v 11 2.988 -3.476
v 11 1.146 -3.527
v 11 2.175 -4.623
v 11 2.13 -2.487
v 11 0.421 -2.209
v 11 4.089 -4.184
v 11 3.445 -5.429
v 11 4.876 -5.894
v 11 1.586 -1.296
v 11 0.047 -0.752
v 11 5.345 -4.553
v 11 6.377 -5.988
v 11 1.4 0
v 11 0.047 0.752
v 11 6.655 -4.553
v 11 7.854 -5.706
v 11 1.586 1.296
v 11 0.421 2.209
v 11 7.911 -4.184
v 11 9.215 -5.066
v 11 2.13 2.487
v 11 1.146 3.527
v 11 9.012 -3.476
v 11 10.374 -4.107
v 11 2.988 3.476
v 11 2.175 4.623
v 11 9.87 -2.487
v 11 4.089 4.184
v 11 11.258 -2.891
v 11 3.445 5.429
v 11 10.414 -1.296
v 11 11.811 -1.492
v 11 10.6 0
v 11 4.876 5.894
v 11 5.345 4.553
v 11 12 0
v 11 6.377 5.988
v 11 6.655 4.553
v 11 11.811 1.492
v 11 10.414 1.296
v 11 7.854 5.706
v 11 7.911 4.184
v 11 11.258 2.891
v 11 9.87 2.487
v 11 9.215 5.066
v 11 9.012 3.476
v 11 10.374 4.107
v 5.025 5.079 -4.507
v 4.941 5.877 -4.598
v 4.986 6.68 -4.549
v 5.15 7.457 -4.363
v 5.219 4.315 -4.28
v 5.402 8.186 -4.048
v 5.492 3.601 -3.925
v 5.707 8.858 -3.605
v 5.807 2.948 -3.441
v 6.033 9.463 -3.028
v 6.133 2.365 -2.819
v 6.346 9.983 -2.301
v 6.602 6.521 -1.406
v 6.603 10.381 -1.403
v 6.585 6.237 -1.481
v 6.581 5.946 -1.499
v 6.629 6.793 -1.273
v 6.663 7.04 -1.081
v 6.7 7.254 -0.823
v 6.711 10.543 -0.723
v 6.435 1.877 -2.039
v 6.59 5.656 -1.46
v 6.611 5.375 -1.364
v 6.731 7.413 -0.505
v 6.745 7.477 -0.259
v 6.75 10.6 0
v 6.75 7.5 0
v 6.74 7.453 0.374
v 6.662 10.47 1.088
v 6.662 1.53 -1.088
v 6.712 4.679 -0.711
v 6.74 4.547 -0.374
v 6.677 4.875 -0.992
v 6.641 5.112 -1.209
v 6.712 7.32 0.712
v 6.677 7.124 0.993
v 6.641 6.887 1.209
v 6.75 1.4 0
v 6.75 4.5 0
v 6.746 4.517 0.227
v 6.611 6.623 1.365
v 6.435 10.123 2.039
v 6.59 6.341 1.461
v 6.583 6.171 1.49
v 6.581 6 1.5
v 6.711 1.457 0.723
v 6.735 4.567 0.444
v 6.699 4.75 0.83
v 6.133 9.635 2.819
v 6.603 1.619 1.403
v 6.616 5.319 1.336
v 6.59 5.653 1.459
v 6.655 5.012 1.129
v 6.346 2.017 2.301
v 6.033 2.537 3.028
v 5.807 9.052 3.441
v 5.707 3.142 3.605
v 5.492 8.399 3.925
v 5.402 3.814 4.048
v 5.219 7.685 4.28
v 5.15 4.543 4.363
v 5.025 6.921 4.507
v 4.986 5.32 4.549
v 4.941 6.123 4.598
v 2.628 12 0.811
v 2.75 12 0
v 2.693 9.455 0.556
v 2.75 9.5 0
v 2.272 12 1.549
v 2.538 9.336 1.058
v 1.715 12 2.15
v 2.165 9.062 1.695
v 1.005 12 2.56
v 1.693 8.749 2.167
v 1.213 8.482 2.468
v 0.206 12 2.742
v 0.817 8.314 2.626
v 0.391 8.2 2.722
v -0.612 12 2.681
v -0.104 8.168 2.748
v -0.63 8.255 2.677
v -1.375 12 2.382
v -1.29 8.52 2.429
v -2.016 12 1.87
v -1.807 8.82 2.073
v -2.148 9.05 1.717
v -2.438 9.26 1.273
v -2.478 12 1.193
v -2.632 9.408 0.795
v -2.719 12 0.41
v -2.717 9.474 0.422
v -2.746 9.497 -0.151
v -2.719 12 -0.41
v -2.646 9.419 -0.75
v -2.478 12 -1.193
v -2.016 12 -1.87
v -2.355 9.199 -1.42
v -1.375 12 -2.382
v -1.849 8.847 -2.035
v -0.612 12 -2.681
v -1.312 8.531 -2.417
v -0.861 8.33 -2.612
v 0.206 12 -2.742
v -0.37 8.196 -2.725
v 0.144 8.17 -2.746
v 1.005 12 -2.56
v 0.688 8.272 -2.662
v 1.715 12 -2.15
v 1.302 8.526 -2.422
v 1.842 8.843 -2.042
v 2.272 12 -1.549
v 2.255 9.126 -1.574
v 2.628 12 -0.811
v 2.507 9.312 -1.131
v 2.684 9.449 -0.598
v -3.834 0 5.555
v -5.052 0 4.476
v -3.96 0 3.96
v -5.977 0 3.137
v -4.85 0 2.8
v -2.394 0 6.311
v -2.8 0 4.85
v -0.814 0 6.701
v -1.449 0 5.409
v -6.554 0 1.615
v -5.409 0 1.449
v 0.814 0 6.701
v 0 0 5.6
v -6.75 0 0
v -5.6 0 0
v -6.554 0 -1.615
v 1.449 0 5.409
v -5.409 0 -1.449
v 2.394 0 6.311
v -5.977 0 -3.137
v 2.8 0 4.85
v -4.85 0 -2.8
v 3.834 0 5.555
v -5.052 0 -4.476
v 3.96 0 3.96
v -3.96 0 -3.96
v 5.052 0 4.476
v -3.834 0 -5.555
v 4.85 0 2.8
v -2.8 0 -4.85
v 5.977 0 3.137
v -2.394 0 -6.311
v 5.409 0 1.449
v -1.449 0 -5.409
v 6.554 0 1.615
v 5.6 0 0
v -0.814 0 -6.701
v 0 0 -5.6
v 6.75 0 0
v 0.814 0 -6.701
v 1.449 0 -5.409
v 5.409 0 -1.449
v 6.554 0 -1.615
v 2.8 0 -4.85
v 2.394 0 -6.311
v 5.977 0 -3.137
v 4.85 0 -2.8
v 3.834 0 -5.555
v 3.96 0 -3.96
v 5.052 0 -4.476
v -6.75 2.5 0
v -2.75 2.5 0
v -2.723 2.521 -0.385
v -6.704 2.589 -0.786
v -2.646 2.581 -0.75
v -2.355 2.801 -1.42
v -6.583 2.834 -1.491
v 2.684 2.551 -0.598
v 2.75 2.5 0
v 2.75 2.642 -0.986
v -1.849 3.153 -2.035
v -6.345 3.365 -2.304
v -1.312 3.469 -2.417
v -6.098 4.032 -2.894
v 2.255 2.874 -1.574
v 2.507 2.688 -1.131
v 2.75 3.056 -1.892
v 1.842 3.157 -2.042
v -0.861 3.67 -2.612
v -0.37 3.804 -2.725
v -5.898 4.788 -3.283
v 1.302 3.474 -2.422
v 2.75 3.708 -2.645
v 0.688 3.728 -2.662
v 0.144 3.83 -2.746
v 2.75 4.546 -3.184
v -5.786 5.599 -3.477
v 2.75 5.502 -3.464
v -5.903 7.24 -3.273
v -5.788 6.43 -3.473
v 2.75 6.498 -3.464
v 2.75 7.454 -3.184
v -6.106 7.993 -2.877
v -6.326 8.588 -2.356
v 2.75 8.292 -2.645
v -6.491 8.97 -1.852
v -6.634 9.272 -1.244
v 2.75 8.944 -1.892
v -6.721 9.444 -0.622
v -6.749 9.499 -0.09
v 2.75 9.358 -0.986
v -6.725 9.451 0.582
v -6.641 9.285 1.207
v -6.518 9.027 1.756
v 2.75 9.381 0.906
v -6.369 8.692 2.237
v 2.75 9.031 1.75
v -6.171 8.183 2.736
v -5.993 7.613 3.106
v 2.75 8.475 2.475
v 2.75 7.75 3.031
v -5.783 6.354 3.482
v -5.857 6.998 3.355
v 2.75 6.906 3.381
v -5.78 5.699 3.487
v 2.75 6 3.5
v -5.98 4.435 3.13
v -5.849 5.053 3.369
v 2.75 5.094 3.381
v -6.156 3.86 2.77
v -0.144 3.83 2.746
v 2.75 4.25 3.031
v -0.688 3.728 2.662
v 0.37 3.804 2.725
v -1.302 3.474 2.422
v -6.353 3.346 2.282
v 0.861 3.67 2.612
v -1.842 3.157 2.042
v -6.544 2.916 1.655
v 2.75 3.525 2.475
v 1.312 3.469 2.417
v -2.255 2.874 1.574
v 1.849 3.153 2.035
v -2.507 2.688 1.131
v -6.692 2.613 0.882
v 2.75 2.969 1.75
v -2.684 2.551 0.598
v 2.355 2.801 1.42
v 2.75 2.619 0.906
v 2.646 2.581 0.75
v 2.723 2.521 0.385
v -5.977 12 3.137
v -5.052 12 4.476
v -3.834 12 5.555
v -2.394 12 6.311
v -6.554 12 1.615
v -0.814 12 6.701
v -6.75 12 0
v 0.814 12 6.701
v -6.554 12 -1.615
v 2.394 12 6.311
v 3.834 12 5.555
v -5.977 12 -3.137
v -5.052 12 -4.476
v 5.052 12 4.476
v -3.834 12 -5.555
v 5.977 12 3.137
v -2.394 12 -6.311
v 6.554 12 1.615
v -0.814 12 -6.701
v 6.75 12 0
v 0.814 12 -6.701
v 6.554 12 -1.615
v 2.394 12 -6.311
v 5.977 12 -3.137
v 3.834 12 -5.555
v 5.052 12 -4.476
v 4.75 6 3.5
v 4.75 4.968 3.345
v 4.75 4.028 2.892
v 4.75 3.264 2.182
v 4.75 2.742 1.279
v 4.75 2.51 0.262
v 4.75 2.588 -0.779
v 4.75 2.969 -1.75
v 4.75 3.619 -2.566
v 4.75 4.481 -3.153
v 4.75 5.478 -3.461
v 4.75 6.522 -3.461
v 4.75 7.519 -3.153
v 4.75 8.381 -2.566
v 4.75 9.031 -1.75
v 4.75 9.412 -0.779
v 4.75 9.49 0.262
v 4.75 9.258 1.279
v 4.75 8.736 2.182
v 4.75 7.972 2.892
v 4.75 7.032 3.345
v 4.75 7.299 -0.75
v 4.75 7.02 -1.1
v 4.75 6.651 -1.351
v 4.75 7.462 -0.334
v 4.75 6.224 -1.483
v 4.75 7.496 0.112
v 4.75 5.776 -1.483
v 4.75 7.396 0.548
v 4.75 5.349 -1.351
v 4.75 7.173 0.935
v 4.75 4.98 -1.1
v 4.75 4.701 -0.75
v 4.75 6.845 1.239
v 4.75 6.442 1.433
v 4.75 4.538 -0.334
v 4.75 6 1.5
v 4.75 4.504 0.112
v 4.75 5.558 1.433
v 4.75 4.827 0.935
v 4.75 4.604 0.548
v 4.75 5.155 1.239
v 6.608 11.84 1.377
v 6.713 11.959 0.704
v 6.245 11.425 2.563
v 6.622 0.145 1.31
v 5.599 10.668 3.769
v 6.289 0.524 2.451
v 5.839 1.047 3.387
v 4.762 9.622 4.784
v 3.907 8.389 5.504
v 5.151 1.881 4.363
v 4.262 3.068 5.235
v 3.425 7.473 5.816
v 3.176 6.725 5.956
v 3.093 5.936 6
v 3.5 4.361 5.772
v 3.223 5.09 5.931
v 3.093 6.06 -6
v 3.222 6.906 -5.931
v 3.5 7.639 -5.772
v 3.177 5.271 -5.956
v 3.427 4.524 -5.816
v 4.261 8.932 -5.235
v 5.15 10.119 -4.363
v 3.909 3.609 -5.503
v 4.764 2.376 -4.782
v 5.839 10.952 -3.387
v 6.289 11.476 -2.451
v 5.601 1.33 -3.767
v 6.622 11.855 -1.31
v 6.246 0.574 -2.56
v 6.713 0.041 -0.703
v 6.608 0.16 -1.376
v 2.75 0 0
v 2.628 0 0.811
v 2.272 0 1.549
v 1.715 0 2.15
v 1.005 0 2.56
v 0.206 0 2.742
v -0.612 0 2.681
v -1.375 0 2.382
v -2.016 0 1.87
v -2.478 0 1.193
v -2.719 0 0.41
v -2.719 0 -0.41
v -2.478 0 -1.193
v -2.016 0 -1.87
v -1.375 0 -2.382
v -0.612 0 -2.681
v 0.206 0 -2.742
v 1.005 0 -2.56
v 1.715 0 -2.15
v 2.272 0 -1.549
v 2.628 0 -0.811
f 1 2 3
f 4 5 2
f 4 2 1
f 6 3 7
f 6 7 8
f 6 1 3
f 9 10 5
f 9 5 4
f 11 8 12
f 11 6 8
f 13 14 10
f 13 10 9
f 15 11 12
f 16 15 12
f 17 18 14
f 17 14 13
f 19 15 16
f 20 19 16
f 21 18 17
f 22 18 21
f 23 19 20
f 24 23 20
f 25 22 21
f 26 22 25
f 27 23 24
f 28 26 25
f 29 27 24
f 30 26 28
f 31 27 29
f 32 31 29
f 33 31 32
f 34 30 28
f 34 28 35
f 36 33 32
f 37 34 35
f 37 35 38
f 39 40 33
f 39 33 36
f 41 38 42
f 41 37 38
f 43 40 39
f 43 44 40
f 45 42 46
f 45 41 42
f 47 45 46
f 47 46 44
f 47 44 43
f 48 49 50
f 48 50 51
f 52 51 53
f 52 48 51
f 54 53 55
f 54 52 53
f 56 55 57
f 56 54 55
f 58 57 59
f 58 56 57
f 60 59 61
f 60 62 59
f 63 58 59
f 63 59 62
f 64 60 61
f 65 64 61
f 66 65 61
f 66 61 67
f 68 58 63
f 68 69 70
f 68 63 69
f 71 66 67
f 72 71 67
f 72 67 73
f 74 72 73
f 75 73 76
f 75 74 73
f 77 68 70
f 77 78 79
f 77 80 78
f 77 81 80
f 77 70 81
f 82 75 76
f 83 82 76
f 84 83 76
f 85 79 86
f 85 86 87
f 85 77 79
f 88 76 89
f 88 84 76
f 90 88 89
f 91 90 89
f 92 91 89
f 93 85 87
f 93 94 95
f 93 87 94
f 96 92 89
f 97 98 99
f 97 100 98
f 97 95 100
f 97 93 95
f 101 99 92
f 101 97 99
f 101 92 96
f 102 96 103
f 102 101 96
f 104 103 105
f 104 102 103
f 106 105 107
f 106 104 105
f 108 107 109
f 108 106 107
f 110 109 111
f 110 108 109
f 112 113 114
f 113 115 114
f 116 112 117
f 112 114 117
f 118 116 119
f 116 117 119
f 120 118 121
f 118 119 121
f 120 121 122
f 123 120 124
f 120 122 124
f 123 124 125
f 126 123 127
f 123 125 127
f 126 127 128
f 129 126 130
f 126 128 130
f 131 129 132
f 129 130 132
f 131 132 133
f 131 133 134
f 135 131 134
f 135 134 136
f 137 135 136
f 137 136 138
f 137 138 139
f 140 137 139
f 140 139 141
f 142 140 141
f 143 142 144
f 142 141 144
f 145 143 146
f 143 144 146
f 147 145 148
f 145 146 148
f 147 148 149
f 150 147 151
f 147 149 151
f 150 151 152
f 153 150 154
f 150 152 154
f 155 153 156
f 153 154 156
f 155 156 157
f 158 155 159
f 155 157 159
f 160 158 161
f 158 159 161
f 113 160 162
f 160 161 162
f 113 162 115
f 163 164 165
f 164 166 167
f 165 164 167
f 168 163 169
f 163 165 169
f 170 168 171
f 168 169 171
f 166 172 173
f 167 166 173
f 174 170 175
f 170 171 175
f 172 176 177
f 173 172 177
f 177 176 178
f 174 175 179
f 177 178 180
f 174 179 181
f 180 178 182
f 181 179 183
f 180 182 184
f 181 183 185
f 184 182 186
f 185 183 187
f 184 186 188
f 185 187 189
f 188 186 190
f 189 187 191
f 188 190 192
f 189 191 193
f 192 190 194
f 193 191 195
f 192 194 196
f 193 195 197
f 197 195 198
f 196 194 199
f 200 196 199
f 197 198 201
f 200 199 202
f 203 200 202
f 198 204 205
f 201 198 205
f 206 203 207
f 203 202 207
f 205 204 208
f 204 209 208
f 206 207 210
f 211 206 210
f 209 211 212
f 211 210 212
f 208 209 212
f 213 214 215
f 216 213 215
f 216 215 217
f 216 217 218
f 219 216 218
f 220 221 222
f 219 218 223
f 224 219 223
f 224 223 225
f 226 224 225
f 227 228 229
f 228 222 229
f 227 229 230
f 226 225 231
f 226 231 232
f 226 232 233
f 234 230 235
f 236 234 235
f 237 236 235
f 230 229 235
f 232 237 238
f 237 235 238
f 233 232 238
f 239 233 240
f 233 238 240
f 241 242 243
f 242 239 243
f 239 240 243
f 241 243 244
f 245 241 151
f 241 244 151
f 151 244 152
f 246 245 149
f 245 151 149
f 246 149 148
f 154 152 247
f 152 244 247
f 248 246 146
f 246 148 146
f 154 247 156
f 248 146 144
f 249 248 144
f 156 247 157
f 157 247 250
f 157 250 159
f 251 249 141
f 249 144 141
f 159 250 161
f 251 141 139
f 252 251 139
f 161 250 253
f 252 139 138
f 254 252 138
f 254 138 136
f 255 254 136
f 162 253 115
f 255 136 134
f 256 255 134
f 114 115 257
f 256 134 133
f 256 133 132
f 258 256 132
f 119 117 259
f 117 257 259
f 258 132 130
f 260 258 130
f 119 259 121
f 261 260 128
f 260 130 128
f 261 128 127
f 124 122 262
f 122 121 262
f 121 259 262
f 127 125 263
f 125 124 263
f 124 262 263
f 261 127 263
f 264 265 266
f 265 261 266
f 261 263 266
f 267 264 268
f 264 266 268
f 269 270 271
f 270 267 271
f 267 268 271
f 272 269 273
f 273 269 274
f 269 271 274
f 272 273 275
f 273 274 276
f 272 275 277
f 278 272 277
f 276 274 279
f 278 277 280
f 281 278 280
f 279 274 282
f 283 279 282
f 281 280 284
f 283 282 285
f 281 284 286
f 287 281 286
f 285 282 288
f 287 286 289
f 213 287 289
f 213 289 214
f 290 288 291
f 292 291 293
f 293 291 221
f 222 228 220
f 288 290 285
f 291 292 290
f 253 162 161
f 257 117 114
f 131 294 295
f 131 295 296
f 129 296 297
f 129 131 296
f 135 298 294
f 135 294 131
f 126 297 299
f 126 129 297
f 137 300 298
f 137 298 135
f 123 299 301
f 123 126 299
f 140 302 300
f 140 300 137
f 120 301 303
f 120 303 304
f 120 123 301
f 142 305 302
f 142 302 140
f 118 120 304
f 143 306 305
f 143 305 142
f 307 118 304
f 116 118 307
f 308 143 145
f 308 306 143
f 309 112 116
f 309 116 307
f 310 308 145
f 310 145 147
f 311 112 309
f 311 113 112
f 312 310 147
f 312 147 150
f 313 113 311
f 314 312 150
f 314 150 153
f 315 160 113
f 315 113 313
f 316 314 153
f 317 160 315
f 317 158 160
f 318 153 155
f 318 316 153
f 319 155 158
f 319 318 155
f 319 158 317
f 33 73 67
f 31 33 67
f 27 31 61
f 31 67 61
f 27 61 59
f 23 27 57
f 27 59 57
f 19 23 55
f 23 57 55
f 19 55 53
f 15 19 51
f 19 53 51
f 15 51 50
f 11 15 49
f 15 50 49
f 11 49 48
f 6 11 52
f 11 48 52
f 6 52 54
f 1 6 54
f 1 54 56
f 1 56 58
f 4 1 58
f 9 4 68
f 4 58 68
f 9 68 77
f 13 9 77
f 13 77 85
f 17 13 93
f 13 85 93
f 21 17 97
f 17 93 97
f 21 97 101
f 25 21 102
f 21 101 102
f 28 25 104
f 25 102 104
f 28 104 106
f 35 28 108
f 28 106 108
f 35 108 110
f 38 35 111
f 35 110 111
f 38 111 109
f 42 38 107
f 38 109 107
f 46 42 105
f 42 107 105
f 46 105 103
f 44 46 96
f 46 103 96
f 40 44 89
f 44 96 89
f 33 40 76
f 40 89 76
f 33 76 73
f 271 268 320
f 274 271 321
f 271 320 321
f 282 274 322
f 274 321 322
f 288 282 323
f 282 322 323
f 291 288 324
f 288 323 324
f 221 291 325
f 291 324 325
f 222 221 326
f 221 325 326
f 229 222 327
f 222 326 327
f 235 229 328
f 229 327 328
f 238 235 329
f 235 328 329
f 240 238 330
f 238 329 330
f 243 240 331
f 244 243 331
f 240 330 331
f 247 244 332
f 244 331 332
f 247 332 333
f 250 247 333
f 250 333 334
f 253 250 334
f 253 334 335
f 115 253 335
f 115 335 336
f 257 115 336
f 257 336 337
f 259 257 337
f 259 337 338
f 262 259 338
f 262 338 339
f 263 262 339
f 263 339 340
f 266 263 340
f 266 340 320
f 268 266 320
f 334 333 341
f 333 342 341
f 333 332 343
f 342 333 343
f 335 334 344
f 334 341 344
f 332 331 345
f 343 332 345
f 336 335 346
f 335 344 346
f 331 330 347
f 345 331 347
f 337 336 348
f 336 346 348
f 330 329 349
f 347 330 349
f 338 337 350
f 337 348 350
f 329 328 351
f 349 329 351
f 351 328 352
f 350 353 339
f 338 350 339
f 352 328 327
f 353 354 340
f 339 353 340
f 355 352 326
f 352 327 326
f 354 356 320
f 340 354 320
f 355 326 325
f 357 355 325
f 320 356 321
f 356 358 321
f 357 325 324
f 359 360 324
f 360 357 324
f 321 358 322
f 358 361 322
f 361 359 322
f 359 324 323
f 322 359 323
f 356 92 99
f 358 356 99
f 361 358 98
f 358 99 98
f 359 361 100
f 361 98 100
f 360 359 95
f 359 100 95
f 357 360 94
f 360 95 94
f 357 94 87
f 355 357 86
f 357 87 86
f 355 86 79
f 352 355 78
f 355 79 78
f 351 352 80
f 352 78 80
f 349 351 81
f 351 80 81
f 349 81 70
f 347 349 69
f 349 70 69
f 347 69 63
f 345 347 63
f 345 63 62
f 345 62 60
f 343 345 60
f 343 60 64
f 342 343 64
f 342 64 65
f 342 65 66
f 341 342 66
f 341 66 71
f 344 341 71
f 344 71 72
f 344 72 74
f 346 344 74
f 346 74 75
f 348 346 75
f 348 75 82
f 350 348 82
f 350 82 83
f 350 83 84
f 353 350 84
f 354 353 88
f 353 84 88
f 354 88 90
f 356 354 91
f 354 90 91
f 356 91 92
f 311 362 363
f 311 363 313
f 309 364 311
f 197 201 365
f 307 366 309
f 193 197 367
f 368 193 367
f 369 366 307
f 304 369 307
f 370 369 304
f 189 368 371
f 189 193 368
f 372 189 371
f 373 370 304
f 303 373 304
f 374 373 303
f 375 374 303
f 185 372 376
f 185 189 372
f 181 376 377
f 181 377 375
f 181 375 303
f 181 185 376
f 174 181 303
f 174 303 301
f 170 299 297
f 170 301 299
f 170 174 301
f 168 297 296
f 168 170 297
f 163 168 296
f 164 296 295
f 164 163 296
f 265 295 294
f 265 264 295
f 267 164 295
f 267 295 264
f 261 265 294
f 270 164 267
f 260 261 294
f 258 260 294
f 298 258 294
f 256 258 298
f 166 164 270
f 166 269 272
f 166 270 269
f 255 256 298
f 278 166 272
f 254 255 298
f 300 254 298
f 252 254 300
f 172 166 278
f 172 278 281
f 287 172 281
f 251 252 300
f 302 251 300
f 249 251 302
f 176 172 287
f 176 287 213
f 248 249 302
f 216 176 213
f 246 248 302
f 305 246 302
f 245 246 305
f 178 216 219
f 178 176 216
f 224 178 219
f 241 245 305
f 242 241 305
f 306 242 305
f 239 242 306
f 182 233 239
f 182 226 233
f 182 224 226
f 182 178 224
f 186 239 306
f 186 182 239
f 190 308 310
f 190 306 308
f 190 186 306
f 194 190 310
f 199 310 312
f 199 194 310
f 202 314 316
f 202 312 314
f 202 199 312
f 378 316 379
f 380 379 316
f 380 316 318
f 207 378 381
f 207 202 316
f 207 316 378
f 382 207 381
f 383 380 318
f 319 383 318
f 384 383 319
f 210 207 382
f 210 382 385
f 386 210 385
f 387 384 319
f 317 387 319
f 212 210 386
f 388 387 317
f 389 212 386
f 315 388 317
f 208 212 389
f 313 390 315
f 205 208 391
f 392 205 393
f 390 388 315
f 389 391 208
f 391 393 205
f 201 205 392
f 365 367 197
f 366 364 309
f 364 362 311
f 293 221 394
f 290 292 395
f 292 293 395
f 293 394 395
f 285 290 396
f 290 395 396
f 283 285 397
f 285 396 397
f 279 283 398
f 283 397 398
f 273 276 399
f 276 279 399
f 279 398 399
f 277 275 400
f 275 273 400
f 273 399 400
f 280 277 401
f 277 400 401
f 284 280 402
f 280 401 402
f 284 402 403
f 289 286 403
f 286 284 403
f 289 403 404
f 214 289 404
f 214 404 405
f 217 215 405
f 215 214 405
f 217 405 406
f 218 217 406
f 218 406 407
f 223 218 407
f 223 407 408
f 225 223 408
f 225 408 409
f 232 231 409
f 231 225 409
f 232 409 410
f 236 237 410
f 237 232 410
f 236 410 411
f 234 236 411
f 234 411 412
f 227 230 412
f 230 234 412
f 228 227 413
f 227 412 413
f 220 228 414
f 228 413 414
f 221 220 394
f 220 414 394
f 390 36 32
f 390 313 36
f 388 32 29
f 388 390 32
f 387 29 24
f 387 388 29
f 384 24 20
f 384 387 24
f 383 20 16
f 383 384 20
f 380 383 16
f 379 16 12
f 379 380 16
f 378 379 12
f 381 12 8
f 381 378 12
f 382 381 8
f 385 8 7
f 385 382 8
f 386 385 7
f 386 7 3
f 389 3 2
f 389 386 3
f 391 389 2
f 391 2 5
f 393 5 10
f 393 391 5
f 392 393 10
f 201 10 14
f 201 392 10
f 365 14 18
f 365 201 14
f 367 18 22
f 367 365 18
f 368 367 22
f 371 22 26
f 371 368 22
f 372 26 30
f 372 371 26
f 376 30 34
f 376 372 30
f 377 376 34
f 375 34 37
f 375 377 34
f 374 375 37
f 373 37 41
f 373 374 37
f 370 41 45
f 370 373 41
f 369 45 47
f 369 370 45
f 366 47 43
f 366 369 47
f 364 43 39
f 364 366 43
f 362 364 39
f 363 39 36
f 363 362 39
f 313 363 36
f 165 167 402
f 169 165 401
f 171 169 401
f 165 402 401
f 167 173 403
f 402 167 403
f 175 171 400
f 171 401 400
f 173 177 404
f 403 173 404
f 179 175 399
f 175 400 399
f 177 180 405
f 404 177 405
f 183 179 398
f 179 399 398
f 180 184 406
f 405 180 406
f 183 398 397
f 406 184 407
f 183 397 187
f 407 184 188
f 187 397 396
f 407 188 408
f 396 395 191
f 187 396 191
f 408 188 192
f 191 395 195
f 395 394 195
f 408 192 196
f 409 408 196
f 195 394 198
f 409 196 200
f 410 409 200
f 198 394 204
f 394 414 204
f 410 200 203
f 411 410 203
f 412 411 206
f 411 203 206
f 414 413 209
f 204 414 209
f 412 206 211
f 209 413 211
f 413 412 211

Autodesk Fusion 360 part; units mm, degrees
sketch "Sketch1" plane through (0, 0, 0) normal (0, 1, 0) x (1, 0, 0)
  circle A0 centre (0, 0) radius 2.75
  circle A1 centre (0, 0) radius 6.75
  dimension "d1" = 5.5
  dimension "d2" = 4
extrude "Extrude1" add sketch "Sketch1" along normal blind 12
ref_plane "WorkPlane1" through (3, 0, 0) normal (1, 0, 0) x (0, 1, 0)
sketch "Sketch2" plane through (3, 0, 0) normal (1, 0, 0) x (0, 1, 0)
  line L0 (12, -6.75) -> (12, 6.75)
  line L1 (0, -6.75) -> (0, 6.75)
  circle A0 centre (6, 0) radius 4.6
  circle A1 centre (6, 0) radius 6
  dimension "d6" = 9.2
  dimension "d7" = 6
  dimension "d8" = 12
  dimension "d9" = 1.4
extrude "Extrude2" add sketch "Sketch2" along normal blind 8
ref_plane "WorkPlane2" through (2.75, 6.403, 0) normal (-1, 0, 0) x (0, 0, -1)
sketch "Sketch3" plane through (2.75, 6.403, 0) normal (-1, 0, 0) x (0, -1, 0)
  line L0 (-5.597, -2.75) -> (-5.597, 2.75)
  line L1 (6.403, -2.75) -> (6.403, 2.75)
  line L2 (6.403, -2.75) -> (6.403, 2.75)
  line L3 (-5.597, -2.75) -> (-5.597, 2.75)
  circle A0 centre (0.403, 0) radius 3.5
  point P0 (0.403, 0)
  dimension "d13" = 6
  dimension "d14" = 12
  dimension "d20" = 7
hole "Hole1" at (2.75, 6, 0) direction (1, 0, 0) diameter 3 depth 10 tip angle 118 counterbore diameter 7 counterbore depth 2
extrude "Extrude3" cut sketch "Sketch3" along normal blind 14.5
sketch "Sketch4" plane through (0, 0, 0) normal (0, 1, 0) x (1, 0, 0)
hole "Hole2" at (0, 0, 0) direction (0, -1, 0) diameter 5.5 depth 25.5 tip angle 118 countersink diameter 11.2 countersink angle 90
equation "d1 = 5 mm + 0.5 mm"
equation "d6 = 9 mm + 0.2 mm"
equation "d7 = d8 / 2"
equation "d13 = d14 / 2"
